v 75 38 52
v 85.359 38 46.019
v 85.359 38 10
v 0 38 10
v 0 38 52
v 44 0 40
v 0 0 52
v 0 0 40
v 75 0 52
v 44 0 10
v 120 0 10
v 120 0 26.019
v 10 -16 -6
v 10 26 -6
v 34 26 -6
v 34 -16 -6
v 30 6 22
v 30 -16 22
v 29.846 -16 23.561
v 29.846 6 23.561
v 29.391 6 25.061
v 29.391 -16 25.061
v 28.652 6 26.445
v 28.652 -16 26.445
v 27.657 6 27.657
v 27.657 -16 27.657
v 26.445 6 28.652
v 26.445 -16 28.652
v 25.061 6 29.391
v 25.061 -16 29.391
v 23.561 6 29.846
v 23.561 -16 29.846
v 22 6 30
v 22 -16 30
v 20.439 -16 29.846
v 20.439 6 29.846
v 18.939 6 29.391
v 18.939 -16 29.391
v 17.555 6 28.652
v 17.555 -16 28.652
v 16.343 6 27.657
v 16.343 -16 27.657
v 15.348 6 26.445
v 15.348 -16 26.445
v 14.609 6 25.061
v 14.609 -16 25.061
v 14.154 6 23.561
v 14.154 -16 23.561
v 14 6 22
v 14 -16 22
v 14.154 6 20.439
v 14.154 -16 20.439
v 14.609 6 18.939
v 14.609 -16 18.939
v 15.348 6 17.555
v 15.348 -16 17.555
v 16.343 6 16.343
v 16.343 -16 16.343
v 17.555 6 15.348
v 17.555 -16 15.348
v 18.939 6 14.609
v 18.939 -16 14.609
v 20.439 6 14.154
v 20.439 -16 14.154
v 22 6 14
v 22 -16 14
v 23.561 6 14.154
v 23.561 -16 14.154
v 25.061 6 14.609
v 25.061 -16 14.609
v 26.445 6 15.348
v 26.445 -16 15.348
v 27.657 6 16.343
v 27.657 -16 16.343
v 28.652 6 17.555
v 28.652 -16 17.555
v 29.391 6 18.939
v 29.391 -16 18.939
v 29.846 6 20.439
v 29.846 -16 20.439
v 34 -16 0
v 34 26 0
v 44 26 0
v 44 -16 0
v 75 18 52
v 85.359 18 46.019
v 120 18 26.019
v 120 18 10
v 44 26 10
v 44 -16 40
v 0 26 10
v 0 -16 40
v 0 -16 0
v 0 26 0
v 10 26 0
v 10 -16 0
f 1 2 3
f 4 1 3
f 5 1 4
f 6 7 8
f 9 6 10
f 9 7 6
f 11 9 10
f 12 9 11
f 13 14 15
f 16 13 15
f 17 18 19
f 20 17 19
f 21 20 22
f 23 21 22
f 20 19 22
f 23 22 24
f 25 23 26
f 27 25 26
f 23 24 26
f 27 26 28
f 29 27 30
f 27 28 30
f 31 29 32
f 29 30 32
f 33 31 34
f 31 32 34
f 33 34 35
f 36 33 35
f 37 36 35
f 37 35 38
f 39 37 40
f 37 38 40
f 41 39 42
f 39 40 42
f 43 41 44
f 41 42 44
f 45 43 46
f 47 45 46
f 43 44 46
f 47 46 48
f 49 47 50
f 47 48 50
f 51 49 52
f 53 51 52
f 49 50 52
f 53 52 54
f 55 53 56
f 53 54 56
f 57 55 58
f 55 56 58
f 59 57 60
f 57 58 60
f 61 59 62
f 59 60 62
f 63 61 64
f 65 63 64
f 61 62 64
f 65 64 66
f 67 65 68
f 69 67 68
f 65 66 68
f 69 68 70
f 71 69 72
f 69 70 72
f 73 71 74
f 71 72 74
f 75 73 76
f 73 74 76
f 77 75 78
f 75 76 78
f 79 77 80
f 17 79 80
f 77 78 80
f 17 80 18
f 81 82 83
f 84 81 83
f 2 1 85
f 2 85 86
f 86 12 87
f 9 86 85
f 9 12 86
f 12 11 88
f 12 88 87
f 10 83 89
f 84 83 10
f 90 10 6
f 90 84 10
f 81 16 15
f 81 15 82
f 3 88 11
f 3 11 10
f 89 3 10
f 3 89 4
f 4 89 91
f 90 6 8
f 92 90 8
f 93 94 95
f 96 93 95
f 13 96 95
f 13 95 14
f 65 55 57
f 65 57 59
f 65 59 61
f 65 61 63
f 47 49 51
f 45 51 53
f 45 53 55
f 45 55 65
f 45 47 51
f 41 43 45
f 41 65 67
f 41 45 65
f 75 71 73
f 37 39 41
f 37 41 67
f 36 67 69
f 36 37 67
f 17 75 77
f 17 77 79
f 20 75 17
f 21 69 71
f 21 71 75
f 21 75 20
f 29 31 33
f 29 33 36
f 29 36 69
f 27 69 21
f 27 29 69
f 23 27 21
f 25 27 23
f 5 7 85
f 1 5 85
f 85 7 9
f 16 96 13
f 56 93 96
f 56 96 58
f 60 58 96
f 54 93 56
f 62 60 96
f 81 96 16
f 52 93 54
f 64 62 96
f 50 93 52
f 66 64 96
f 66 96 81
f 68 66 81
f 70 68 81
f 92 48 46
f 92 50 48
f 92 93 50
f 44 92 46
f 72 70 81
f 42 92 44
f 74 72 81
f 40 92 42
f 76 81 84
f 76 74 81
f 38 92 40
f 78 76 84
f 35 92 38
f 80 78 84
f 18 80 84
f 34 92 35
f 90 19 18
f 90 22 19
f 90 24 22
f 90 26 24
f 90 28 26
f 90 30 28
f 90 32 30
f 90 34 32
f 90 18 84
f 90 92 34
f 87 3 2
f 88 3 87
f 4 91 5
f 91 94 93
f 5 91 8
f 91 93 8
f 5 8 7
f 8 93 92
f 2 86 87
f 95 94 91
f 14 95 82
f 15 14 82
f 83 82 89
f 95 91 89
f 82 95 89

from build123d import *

# Parameters (mm, degrees)
F1_DEPTH  = 16
F2_W      = 44
F2_H      = 30
F3_DEPTH  = 18
F4_R      = 8
F5_DEPTH  = 22
F7_DEPTH  = 26
F9_DEPTH  = 42
F11_DEPTH = 20.001
F13_DEPTH = 20


with BuildPart() as f1:
    # F0 (on Front) → F1 (new body)
    with BuildSketch(Plane.XZ):
        Polygon((0, 40), (0, 0), (10, 0), (10, -6), (34, -6), (34, 0), (44, 0), (44, 40), align=None)
    extrude(amount=F1_DEPTH)

    # F2 (on face) → F3 (join)
    with BuildSketch(Plane.XZ):
        Polygon((0, 52), (0, 40), (44, 40), (44, 10), (120, 10), (120, 26.019238), (75, 52), align=None)
        with Locations((22, 25)):
            Rectangle(F2_W, F2_H)
    extrude(amount=-F3_DEPTH)

    # F4 (on face) → F5 (cut)
    with BuildSketch(Plane.XZ.offset(16)):
        with Locations((22, 22)):
            Circle(F4_R)
    extrude(amount=-F5_DEPTH, mode=Mode.SUBTRACT)

    # F6 (on face) → F7 (join)
    with BuildSketch(Plane.XZ):
        Polygon((44, 10), (0, 10), (0, 0), (10, 0), (10, -6), (34, -6), (34, 0), (44, 0), align=None)
    extrude(amount=-F7_DEPTH)

    # F8 (on face) → F9 (join)
    with BuildSketch(Plane(origin=(0, 0, 10), x_dir=(1, 0, 0), z_dir=(0, 0, -1))):
        Polygon((85.358984, -18), (85.358984, -38), (120, -18), align=None)
    extrude(amount=-F9_DEPTH)

    # F10 (on face) → F11 (cut, through all)
    with BuildSketch(Plane.XZ.offset(-18)):
        Polygon((120, 52), (85.358984, 52), (85.358984, 46.019238), (120, 26.019238), align=None)
    extrude(amount=-F11_DEPTH, mode=Mode.SUBTRACT)

    # F12 (on face) → F13 (join)
    with BuildSketch(Plane(origin=(0, 18, 0), x_dir=(-1, 0, 0), z_dir=(0, 1, 0))):
        Polygon((-75, 52), (-85.358984, 46.019238), (-85.358984, 10), (-44, 10), (0, 10), (0, 52), align=None)
    extrude(amount=F13_DEPTH)


solid = f1.part
